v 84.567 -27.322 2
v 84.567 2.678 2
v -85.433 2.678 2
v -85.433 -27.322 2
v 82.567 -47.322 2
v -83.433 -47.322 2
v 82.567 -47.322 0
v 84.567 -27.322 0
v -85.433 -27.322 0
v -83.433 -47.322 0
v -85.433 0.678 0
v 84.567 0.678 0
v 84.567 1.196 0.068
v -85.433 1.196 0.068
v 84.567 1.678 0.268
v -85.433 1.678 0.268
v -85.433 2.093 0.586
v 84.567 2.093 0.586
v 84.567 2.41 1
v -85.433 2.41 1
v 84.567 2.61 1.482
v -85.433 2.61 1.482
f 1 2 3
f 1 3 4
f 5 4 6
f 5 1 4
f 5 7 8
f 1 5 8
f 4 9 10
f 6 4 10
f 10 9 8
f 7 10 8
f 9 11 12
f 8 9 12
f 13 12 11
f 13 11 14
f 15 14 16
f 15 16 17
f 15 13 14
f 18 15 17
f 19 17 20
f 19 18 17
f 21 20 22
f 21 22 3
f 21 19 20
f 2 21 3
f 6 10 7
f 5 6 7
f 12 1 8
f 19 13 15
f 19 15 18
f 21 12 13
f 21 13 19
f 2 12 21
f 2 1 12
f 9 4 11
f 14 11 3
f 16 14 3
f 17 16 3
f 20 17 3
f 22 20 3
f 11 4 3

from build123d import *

# Parameters (mm, degrees)
F1_DEPTH = 2
F3_DEPTH = 170


with BuildPart() as f1:
    # F0 (on Top) → F1 (new body)
    with BuildSketch(Plane.XY):
        Polygon((84.566931, 0.678322), (-85.433069, 0.678322), (-85.433069, -27.321678), (-83.433069, -47.321678), (82.566931, -47.321678), (84.566931, -27.321678), align=None)
    extrude(amount=F1_DEPTH)

    # F2 (on face) → F3 (join)
    with BuildSketch(Plane.YZ.offset(84.566931)):
        with BuildLine():
            Line((0.678322, 2), (0.678322, 0))
            ThreePointArc((0.678322, 0), (2.092536, 0.585786), (2.678322, 2))
            Line((2.678322, 2), (0.678322, 2))
        make_face()
    extrude(amount=-F3_DEPTH)


solid = f1.part
